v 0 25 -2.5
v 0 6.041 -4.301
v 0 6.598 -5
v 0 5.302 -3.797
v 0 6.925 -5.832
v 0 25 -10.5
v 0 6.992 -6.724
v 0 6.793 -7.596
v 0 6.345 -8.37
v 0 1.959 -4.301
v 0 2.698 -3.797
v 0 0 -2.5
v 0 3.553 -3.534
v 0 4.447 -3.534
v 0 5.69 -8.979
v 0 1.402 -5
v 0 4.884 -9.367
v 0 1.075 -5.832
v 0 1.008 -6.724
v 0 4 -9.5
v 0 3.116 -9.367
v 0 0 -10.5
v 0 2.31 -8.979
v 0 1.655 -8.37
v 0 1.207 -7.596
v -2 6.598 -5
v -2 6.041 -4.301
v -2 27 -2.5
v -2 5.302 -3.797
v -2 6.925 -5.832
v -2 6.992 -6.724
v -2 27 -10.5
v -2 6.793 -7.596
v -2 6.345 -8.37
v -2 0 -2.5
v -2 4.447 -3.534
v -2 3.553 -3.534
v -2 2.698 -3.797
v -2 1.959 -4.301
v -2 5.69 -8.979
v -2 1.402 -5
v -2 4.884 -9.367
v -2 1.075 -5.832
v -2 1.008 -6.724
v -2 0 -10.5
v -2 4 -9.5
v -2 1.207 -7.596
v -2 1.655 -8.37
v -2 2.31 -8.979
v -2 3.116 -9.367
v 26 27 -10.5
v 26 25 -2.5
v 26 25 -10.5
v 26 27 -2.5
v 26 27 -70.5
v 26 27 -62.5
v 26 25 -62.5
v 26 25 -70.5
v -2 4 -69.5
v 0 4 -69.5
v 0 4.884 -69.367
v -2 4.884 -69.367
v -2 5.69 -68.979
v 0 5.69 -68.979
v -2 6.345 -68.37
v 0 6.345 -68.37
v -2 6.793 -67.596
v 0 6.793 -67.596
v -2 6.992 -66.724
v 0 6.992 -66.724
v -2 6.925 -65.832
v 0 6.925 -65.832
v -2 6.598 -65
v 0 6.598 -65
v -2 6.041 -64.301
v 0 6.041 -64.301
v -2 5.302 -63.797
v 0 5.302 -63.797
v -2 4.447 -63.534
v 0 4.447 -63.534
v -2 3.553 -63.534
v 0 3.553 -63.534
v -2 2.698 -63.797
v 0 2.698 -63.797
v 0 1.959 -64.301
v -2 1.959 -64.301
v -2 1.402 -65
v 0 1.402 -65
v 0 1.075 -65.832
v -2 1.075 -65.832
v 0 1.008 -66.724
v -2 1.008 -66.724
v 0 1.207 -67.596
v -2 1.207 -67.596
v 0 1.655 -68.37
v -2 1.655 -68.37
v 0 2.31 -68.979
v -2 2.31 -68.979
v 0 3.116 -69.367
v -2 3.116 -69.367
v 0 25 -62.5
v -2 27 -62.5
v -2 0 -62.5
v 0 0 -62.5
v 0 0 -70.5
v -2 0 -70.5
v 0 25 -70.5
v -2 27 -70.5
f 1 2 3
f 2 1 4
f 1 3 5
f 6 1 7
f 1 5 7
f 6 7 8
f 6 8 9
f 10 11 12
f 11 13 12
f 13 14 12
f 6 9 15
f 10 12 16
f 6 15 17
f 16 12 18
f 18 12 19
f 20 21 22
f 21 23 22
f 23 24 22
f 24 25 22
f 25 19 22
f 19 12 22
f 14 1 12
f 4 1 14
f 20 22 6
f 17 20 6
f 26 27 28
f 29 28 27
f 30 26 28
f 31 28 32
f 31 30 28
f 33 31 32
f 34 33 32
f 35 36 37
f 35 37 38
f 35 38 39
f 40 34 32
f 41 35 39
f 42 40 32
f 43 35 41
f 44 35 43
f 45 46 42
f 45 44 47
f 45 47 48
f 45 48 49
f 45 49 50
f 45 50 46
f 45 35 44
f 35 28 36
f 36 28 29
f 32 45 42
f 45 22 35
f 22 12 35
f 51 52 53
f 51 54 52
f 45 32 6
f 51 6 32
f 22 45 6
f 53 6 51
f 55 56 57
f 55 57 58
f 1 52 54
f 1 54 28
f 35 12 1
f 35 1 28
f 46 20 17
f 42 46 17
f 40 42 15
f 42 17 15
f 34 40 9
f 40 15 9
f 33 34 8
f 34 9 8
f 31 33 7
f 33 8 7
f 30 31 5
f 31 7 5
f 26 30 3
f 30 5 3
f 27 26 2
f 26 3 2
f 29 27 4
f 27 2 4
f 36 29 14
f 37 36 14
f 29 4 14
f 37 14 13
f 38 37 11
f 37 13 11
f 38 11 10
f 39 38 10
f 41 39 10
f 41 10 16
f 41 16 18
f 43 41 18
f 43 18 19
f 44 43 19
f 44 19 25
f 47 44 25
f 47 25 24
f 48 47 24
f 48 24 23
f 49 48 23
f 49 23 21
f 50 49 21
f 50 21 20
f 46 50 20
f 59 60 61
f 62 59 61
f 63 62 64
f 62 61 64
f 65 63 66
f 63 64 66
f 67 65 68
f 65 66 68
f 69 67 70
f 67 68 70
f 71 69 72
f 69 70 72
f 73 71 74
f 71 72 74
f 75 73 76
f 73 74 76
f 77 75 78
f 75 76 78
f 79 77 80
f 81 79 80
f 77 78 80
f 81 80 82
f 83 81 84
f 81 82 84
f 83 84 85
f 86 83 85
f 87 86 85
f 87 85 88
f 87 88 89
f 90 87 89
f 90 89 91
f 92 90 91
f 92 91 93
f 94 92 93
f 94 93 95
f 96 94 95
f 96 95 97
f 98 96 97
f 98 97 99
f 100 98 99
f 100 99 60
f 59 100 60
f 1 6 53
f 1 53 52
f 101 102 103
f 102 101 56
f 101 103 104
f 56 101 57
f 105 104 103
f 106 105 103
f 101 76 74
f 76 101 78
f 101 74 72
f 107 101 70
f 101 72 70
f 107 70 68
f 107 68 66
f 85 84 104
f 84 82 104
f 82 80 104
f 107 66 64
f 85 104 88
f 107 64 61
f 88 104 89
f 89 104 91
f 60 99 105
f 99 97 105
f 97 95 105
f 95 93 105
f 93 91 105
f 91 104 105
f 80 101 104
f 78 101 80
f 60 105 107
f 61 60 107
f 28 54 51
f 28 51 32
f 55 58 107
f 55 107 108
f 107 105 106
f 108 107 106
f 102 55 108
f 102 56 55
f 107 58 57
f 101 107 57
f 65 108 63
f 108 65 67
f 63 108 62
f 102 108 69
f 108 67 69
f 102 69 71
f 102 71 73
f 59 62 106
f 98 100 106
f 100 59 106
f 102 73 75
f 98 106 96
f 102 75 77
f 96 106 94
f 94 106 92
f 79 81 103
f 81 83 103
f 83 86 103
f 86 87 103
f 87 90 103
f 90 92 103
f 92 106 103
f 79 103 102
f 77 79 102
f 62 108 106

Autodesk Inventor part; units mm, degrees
ref_plane "YZ Plane" through (0, 0, 0) normal (1, 0, 0) x (0, 1, 0)
ref_plane "XZ Plane" through (0, 0, 0) normal (0, 1, 0) x (-1, 0, 0)
ref_plane "XY Plane" through (0, 0, 0) normal (0, 0, 1) x (1, 0, 0)
sketch "Esboço1" plane through (0, 0, 0) normal (0, 1, 0) x (-1, 0, 0)
  line L0 (0, 0) -> (0, -72)
  line L1 (0, 0) -> (0, -2.5)
  line L2 (0, -72) -> (0, -70.5)
  line L3 (0, -2.5) -> (2, -2.5)
  line L4 (2, -2.5) -> (2, -10.5)
  line L5 (2, -10.5) -> (0, -10.5)
  line L6 (0, -10.5) -> (0, -2.5)
  line L7 (0, -70.5) -> (2, -70.5)
  line L8 (2, -70.5) -> (2, -62.5)
  line L9 (2, -62.5) -> (0, -62.5)
  line L10 (0, -62.5) -> (0, -70.5)
  dimension "d0" = 72
  dimension "d1" = 2.5
  dimension "d2" = 1.5
  dimension "d3" = 2
  dimension "d4" = 8
  dimension "d5" = 2
  dimension "d6" = 8
extrude "Extrusão1" add sketch "Esboço1" along normal blind 27
sketch "Esboço2" plane through (0, 0, -2.5) normal (1, 0, 0) x (0, 0, -1)
  line L0 (0, 27) -> (8, 27) projected
  line L1 (8, 0) -> (8, 27) projected
  line L2 (0, 27) -> (8, 27)
  line L3 (8, 27) -> (8, 25)
  line L4 (8, 25) -> (0, 25)
  line L5 (0, 25) -> (0, 27)
  line L6 (68, 27) -> (60, 27) projected
  line L7 (60, 27) -> (68, 27)
  line L8 (68, 27) -> (68, 25)
  line L9 (68, 25) -> (60, 25)
  line L10 (60, 25) -> (60, 27)
  point P0 (-2.5, 0)
  dimension "d9" = 2
extrude "Extrusão2" add sketch "Esboço2" along normal blind 26
sketch "Esboço3" plane through (0, 0, -2.5) normal (1, 0, 0) x (0, 0, -1)
  line L0 (0, 0) -> (8, 0) projected
  line L1 (4, 0) -> (4, 4)
  line L2 (60, 0) -> (68, 0) projected
  line L3 (64, 0) -> (64, 4)
  circle A0 centre (4, 4) radius 3
  circle A1 centre (64, 4) radius 3
  point P0 (-2.5, 0)
  dimension "d12" = 4
  dimension "d13" = 4
  dimension "d14" = 6
  dimension "d15" = 6
extrude "Extrusão3" cut sketch "Esboço3" against normal blind 2
properties part number "Fixação Caixa de Segurança Dianteira"
